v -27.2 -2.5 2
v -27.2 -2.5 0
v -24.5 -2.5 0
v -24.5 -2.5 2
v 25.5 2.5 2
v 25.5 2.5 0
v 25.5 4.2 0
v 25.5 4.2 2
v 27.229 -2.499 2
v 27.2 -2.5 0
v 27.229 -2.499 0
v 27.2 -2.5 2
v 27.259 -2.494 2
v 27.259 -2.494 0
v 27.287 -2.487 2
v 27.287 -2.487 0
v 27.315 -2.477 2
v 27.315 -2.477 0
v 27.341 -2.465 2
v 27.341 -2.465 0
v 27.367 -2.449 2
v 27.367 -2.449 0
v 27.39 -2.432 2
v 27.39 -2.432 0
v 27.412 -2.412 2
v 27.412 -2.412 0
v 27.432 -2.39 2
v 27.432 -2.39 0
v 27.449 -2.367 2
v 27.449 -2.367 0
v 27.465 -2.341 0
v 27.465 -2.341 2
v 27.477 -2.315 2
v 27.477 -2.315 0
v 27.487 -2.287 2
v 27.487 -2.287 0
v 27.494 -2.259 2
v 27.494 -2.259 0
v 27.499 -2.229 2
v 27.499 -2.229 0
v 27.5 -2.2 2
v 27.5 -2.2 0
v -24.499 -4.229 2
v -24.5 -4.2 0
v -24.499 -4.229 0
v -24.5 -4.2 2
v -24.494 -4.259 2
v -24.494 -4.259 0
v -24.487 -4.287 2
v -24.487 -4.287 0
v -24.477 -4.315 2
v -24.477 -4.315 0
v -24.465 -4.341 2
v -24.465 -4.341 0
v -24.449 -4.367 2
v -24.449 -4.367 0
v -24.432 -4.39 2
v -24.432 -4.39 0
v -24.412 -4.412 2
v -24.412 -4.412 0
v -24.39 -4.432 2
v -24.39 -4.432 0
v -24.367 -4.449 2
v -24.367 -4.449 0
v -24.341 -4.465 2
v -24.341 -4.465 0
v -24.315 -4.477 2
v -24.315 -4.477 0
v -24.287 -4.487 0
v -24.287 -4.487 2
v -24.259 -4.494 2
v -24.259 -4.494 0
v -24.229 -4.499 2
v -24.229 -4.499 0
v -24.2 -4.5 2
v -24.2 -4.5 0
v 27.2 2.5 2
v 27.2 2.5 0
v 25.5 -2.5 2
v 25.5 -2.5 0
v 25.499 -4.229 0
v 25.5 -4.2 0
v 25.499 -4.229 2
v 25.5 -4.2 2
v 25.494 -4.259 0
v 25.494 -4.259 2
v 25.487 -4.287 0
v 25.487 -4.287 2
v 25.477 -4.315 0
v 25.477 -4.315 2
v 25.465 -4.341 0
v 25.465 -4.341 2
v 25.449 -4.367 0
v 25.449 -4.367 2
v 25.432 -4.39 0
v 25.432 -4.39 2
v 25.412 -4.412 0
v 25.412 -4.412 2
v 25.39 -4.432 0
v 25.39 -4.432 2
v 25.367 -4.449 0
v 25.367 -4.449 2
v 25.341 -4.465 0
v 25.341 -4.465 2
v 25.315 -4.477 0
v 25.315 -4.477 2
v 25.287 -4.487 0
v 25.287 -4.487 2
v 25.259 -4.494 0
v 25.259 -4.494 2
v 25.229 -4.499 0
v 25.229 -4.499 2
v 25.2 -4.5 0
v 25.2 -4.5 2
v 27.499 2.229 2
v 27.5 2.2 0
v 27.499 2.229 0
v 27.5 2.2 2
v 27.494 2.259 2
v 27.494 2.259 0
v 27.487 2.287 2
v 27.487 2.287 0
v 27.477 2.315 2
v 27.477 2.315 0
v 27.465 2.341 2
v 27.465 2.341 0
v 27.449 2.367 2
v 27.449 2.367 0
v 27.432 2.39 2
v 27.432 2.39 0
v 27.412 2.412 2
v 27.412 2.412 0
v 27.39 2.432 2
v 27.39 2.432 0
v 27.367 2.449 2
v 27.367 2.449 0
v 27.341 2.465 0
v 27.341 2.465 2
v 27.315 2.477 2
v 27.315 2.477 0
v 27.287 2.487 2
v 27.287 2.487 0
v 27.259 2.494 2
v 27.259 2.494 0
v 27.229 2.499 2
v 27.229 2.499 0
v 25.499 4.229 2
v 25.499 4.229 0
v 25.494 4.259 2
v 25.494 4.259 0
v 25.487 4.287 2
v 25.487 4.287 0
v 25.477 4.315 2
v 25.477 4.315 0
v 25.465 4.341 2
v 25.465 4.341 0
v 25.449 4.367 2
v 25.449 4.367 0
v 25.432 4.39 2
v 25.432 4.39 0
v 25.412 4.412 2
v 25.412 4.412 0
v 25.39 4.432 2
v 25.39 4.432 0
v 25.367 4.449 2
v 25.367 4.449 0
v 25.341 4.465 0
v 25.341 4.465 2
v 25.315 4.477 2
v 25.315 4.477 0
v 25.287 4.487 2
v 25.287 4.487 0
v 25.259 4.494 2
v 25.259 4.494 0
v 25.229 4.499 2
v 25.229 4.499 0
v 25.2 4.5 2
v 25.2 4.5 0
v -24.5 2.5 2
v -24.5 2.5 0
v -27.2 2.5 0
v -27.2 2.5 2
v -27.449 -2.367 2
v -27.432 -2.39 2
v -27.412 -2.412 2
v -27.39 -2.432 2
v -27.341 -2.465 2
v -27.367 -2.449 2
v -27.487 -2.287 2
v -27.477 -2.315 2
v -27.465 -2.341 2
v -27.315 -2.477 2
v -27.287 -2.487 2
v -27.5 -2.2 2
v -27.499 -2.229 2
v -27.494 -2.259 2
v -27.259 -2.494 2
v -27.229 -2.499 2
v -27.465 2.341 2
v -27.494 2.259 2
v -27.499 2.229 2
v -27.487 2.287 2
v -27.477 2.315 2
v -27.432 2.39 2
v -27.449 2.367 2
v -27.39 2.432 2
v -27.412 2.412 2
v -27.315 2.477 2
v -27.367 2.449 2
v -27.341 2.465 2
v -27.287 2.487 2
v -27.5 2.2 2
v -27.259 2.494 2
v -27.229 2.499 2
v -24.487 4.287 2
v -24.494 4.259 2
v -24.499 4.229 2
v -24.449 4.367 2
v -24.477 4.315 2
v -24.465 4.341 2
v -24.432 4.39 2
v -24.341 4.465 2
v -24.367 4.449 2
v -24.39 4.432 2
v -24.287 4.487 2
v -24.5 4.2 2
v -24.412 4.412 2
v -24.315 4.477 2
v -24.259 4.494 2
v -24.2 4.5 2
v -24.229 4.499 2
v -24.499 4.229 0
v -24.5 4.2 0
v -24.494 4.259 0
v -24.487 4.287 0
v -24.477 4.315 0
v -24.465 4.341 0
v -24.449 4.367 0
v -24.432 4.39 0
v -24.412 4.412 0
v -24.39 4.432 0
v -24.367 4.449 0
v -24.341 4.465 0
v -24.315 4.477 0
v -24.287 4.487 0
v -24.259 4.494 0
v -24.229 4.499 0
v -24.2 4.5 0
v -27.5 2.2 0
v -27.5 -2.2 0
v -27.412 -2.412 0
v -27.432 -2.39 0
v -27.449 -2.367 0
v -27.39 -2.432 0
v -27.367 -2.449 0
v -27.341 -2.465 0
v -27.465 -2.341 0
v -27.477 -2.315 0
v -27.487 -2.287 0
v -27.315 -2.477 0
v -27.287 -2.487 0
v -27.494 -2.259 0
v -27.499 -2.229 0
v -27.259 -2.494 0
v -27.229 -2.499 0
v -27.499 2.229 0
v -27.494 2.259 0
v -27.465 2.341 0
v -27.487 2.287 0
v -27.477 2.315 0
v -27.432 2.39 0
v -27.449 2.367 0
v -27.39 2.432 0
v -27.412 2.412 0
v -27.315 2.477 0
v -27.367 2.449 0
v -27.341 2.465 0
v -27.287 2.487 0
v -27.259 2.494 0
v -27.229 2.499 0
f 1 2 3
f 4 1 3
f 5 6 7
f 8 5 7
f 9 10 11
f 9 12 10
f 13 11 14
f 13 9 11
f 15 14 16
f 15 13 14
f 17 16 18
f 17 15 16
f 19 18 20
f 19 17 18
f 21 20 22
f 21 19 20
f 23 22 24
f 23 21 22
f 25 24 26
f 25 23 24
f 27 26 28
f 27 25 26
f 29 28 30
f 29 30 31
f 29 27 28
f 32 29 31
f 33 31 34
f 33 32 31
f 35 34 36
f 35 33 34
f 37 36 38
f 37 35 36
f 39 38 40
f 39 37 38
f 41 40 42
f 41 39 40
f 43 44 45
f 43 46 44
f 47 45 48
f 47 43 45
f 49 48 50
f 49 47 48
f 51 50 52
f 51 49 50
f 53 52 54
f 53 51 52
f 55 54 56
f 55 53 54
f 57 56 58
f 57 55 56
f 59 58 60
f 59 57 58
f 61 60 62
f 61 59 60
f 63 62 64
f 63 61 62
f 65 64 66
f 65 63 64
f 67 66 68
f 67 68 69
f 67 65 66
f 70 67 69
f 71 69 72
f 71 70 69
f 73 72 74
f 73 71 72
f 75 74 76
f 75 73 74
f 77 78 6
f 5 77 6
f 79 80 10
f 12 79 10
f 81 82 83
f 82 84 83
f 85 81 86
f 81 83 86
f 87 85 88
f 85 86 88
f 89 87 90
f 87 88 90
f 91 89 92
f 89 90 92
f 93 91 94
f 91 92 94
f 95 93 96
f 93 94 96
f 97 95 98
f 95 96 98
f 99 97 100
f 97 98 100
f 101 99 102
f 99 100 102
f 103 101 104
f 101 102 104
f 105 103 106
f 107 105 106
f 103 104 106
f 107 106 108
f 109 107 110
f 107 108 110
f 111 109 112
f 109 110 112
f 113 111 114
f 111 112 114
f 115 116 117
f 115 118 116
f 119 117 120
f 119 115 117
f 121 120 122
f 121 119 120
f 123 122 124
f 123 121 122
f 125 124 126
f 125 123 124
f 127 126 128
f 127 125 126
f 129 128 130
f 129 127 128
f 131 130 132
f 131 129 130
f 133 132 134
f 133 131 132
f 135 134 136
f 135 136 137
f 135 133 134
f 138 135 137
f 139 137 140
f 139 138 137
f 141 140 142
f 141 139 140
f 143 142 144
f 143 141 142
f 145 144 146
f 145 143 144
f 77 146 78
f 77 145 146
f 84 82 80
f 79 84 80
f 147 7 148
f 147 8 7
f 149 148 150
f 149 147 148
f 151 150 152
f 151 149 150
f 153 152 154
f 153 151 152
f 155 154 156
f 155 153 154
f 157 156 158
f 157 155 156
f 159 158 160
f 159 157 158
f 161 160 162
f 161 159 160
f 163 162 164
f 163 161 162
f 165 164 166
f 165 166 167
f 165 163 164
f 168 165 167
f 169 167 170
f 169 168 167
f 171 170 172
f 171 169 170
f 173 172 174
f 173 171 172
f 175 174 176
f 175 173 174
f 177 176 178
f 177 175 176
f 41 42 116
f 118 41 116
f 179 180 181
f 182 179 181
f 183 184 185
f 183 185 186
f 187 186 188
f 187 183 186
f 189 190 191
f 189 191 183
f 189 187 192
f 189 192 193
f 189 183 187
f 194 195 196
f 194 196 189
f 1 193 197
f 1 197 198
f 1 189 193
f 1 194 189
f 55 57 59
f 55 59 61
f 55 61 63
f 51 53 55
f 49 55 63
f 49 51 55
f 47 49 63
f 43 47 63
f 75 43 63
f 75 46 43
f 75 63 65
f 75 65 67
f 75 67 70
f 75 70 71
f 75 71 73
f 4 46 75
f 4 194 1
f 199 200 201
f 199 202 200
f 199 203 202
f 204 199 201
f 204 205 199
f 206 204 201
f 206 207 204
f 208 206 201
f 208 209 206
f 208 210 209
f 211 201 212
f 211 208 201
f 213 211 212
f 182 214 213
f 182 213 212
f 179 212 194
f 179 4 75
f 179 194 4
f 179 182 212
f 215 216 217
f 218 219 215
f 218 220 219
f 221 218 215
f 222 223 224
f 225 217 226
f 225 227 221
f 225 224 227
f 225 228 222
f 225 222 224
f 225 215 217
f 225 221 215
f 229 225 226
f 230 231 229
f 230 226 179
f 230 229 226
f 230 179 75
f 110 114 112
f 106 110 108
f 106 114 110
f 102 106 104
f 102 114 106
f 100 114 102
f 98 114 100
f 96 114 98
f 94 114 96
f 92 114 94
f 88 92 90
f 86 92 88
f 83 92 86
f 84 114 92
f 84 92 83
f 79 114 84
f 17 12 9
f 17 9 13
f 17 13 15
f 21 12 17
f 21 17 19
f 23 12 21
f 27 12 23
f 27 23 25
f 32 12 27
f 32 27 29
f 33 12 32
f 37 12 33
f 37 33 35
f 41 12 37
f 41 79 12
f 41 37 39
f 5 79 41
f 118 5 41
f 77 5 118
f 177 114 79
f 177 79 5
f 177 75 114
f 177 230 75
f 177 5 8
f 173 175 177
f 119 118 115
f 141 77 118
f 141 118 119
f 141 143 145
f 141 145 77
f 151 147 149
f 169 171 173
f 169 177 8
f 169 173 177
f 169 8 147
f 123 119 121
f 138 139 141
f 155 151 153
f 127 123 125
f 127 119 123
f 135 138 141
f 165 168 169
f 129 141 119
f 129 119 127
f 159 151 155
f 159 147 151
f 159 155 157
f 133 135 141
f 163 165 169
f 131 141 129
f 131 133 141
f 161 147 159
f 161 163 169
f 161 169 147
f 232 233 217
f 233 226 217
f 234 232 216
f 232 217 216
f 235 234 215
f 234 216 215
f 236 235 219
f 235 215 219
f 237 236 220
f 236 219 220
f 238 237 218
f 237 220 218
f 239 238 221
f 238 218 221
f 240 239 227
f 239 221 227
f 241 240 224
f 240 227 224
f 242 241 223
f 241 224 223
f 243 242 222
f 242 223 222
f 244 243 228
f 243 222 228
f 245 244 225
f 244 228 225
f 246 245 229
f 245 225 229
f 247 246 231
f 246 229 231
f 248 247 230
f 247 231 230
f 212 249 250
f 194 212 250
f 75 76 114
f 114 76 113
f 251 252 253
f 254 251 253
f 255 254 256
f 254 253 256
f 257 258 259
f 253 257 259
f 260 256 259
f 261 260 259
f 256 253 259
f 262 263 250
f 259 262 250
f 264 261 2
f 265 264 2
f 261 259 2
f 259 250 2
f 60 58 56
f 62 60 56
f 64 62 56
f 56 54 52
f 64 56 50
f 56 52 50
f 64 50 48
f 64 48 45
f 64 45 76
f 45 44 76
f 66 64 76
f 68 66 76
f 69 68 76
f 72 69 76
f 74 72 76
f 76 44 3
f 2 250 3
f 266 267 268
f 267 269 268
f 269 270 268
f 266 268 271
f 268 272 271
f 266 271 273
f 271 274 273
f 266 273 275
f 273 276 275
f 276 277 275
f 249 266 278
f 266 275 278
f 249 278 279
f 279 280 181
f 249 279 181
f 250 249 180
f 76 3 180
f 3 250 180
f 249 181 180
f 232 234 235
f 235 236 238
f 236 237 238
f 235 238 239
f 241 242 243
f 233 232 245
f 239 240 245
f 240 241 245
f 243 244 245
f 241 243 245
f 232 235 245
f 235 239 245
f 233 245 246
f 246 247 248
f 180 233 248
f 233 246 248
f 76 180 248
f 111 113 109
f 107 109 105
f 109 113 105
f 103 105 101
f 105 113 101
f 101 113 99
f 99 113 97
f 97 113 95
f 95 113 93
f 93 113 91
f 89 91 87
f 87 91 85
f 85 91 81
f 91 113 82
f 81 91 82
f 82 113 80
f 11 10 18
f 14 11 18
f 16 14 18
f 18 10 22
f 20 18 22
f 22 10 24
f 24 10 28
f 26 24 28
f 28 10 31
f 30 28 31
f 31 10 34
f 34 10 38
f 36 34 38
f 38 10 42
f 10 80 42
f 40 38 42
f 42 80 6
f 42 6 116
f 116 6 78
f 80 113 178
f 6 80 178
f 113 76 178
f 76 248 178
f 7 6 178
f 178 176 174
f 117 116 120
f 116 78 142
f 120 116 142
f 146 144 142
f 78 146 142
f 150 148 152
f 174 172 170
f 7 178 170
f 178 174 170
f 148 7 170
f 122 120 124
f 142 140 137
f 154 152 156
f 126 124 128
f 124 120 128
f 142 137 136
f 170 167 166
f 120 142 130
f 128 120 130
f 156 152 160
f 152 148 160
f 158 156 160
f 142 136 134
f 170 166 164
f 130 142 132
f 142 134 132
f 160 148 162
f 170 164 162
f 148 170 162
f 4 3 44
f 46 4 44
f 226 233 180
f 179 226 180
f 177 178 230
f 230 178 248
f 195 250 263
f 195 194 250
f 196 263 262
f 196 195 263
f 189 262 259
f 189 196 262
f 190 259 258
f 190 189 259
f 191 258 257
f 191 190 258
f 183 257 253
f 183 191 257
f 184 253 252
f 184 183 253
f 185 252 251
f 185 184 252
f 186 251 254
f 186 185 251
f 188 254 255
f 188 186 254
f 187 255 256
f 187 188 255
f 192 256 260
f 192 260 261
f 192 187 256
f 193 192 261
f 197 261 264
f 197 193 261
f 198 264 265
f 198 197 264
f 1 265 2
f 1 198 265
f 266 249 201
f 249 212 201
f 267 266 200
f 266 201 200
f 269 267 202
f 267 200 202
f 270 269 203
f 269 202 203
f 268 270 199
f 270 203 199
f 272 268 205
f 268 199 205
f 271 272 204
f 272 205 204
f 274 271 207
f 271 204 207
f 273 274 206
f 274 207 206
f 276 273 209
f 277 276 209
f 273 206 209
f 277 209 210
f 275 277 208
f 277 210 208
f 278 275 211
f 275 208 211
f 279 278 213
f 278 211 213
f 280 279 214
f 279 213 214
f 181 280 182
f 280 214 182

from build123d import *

# Parameters (mm, degrees)
BOSS_EXTRUDE1_DEPTH = 2
FILLET5_R           = 0.3
FILLET7_R           = 0.3
FILLET8_R           = 0.3
FILLET9_R           = 0.3
FILLET10_R          = 0.3
FILLET11_R          = 0.3


with BuildPart() as part:
    # Sketch1 → Boss-Extrude1 (new body)
    with BuildSketch(Plane.XY):
        Polygon((-24.5, -2.5), (-24.5, -4.5), (25.5, -4.5), (25.5, -2.5), (27.5, -2.5), (27.5, 2.5), (25.5, 2.5), (25.5, 4.5), (-24.5, 4.5), (-24.5, 2.5), (-27.5, 2.5), (-27.5, -2.5), align=None)
    extrude(amount=BOSS_EXTRUDE1_DEPTH)

    # Fillet5
    fillet5_edges = [part.edges().sort_by_distance(p)[0] for p in [
        (-27.5, -2.5, 1),
    ]]
    fillet(fillet5_edges, radius=FILLET5_R)

    # Fillet7
    fillet7_edges = [part.edges().sort_by_distance(p)[0] for p in [
        (-24.5, -4.5, 1),
    ]]
    fillet(fillet7_edges, radius=FILLET7_R)

    # Fillet8
    fillet8_edges = [part.edges().sort_by_distance(p)[0] for p in [
        (-24.5, 4.5, 1),
    ]]
    fillet(fillet8_edges, radius=FILLET8_R)

    # Fillet9
    fillet9_edges = [part.edges().sort_by_distance(p)[0] for p in [
        (25.5, -4.5, 1),
    ]]
    fillet(fillet9_edges, radius=FILLET9_R)

    # Fillet10
    fillet10_edges = [part.edges().sort_by_distance(p)[0] for p in [
        (25.5, 4.5, 1),
        (27.5, 2.5, 1),
        (27.5, -2.5, 1),
    ]]
    fillet(fillet10_edges, radius=FILLET10_R)

    # Fillet11
    fillet11_edges = [part.edges().sort_by_distance(p)[0] for p in [
        (-27.5, 2.5, 1),
    ]]
    fillet(fillet11_edges, radius=FILLET11_R)


solid = part.part
